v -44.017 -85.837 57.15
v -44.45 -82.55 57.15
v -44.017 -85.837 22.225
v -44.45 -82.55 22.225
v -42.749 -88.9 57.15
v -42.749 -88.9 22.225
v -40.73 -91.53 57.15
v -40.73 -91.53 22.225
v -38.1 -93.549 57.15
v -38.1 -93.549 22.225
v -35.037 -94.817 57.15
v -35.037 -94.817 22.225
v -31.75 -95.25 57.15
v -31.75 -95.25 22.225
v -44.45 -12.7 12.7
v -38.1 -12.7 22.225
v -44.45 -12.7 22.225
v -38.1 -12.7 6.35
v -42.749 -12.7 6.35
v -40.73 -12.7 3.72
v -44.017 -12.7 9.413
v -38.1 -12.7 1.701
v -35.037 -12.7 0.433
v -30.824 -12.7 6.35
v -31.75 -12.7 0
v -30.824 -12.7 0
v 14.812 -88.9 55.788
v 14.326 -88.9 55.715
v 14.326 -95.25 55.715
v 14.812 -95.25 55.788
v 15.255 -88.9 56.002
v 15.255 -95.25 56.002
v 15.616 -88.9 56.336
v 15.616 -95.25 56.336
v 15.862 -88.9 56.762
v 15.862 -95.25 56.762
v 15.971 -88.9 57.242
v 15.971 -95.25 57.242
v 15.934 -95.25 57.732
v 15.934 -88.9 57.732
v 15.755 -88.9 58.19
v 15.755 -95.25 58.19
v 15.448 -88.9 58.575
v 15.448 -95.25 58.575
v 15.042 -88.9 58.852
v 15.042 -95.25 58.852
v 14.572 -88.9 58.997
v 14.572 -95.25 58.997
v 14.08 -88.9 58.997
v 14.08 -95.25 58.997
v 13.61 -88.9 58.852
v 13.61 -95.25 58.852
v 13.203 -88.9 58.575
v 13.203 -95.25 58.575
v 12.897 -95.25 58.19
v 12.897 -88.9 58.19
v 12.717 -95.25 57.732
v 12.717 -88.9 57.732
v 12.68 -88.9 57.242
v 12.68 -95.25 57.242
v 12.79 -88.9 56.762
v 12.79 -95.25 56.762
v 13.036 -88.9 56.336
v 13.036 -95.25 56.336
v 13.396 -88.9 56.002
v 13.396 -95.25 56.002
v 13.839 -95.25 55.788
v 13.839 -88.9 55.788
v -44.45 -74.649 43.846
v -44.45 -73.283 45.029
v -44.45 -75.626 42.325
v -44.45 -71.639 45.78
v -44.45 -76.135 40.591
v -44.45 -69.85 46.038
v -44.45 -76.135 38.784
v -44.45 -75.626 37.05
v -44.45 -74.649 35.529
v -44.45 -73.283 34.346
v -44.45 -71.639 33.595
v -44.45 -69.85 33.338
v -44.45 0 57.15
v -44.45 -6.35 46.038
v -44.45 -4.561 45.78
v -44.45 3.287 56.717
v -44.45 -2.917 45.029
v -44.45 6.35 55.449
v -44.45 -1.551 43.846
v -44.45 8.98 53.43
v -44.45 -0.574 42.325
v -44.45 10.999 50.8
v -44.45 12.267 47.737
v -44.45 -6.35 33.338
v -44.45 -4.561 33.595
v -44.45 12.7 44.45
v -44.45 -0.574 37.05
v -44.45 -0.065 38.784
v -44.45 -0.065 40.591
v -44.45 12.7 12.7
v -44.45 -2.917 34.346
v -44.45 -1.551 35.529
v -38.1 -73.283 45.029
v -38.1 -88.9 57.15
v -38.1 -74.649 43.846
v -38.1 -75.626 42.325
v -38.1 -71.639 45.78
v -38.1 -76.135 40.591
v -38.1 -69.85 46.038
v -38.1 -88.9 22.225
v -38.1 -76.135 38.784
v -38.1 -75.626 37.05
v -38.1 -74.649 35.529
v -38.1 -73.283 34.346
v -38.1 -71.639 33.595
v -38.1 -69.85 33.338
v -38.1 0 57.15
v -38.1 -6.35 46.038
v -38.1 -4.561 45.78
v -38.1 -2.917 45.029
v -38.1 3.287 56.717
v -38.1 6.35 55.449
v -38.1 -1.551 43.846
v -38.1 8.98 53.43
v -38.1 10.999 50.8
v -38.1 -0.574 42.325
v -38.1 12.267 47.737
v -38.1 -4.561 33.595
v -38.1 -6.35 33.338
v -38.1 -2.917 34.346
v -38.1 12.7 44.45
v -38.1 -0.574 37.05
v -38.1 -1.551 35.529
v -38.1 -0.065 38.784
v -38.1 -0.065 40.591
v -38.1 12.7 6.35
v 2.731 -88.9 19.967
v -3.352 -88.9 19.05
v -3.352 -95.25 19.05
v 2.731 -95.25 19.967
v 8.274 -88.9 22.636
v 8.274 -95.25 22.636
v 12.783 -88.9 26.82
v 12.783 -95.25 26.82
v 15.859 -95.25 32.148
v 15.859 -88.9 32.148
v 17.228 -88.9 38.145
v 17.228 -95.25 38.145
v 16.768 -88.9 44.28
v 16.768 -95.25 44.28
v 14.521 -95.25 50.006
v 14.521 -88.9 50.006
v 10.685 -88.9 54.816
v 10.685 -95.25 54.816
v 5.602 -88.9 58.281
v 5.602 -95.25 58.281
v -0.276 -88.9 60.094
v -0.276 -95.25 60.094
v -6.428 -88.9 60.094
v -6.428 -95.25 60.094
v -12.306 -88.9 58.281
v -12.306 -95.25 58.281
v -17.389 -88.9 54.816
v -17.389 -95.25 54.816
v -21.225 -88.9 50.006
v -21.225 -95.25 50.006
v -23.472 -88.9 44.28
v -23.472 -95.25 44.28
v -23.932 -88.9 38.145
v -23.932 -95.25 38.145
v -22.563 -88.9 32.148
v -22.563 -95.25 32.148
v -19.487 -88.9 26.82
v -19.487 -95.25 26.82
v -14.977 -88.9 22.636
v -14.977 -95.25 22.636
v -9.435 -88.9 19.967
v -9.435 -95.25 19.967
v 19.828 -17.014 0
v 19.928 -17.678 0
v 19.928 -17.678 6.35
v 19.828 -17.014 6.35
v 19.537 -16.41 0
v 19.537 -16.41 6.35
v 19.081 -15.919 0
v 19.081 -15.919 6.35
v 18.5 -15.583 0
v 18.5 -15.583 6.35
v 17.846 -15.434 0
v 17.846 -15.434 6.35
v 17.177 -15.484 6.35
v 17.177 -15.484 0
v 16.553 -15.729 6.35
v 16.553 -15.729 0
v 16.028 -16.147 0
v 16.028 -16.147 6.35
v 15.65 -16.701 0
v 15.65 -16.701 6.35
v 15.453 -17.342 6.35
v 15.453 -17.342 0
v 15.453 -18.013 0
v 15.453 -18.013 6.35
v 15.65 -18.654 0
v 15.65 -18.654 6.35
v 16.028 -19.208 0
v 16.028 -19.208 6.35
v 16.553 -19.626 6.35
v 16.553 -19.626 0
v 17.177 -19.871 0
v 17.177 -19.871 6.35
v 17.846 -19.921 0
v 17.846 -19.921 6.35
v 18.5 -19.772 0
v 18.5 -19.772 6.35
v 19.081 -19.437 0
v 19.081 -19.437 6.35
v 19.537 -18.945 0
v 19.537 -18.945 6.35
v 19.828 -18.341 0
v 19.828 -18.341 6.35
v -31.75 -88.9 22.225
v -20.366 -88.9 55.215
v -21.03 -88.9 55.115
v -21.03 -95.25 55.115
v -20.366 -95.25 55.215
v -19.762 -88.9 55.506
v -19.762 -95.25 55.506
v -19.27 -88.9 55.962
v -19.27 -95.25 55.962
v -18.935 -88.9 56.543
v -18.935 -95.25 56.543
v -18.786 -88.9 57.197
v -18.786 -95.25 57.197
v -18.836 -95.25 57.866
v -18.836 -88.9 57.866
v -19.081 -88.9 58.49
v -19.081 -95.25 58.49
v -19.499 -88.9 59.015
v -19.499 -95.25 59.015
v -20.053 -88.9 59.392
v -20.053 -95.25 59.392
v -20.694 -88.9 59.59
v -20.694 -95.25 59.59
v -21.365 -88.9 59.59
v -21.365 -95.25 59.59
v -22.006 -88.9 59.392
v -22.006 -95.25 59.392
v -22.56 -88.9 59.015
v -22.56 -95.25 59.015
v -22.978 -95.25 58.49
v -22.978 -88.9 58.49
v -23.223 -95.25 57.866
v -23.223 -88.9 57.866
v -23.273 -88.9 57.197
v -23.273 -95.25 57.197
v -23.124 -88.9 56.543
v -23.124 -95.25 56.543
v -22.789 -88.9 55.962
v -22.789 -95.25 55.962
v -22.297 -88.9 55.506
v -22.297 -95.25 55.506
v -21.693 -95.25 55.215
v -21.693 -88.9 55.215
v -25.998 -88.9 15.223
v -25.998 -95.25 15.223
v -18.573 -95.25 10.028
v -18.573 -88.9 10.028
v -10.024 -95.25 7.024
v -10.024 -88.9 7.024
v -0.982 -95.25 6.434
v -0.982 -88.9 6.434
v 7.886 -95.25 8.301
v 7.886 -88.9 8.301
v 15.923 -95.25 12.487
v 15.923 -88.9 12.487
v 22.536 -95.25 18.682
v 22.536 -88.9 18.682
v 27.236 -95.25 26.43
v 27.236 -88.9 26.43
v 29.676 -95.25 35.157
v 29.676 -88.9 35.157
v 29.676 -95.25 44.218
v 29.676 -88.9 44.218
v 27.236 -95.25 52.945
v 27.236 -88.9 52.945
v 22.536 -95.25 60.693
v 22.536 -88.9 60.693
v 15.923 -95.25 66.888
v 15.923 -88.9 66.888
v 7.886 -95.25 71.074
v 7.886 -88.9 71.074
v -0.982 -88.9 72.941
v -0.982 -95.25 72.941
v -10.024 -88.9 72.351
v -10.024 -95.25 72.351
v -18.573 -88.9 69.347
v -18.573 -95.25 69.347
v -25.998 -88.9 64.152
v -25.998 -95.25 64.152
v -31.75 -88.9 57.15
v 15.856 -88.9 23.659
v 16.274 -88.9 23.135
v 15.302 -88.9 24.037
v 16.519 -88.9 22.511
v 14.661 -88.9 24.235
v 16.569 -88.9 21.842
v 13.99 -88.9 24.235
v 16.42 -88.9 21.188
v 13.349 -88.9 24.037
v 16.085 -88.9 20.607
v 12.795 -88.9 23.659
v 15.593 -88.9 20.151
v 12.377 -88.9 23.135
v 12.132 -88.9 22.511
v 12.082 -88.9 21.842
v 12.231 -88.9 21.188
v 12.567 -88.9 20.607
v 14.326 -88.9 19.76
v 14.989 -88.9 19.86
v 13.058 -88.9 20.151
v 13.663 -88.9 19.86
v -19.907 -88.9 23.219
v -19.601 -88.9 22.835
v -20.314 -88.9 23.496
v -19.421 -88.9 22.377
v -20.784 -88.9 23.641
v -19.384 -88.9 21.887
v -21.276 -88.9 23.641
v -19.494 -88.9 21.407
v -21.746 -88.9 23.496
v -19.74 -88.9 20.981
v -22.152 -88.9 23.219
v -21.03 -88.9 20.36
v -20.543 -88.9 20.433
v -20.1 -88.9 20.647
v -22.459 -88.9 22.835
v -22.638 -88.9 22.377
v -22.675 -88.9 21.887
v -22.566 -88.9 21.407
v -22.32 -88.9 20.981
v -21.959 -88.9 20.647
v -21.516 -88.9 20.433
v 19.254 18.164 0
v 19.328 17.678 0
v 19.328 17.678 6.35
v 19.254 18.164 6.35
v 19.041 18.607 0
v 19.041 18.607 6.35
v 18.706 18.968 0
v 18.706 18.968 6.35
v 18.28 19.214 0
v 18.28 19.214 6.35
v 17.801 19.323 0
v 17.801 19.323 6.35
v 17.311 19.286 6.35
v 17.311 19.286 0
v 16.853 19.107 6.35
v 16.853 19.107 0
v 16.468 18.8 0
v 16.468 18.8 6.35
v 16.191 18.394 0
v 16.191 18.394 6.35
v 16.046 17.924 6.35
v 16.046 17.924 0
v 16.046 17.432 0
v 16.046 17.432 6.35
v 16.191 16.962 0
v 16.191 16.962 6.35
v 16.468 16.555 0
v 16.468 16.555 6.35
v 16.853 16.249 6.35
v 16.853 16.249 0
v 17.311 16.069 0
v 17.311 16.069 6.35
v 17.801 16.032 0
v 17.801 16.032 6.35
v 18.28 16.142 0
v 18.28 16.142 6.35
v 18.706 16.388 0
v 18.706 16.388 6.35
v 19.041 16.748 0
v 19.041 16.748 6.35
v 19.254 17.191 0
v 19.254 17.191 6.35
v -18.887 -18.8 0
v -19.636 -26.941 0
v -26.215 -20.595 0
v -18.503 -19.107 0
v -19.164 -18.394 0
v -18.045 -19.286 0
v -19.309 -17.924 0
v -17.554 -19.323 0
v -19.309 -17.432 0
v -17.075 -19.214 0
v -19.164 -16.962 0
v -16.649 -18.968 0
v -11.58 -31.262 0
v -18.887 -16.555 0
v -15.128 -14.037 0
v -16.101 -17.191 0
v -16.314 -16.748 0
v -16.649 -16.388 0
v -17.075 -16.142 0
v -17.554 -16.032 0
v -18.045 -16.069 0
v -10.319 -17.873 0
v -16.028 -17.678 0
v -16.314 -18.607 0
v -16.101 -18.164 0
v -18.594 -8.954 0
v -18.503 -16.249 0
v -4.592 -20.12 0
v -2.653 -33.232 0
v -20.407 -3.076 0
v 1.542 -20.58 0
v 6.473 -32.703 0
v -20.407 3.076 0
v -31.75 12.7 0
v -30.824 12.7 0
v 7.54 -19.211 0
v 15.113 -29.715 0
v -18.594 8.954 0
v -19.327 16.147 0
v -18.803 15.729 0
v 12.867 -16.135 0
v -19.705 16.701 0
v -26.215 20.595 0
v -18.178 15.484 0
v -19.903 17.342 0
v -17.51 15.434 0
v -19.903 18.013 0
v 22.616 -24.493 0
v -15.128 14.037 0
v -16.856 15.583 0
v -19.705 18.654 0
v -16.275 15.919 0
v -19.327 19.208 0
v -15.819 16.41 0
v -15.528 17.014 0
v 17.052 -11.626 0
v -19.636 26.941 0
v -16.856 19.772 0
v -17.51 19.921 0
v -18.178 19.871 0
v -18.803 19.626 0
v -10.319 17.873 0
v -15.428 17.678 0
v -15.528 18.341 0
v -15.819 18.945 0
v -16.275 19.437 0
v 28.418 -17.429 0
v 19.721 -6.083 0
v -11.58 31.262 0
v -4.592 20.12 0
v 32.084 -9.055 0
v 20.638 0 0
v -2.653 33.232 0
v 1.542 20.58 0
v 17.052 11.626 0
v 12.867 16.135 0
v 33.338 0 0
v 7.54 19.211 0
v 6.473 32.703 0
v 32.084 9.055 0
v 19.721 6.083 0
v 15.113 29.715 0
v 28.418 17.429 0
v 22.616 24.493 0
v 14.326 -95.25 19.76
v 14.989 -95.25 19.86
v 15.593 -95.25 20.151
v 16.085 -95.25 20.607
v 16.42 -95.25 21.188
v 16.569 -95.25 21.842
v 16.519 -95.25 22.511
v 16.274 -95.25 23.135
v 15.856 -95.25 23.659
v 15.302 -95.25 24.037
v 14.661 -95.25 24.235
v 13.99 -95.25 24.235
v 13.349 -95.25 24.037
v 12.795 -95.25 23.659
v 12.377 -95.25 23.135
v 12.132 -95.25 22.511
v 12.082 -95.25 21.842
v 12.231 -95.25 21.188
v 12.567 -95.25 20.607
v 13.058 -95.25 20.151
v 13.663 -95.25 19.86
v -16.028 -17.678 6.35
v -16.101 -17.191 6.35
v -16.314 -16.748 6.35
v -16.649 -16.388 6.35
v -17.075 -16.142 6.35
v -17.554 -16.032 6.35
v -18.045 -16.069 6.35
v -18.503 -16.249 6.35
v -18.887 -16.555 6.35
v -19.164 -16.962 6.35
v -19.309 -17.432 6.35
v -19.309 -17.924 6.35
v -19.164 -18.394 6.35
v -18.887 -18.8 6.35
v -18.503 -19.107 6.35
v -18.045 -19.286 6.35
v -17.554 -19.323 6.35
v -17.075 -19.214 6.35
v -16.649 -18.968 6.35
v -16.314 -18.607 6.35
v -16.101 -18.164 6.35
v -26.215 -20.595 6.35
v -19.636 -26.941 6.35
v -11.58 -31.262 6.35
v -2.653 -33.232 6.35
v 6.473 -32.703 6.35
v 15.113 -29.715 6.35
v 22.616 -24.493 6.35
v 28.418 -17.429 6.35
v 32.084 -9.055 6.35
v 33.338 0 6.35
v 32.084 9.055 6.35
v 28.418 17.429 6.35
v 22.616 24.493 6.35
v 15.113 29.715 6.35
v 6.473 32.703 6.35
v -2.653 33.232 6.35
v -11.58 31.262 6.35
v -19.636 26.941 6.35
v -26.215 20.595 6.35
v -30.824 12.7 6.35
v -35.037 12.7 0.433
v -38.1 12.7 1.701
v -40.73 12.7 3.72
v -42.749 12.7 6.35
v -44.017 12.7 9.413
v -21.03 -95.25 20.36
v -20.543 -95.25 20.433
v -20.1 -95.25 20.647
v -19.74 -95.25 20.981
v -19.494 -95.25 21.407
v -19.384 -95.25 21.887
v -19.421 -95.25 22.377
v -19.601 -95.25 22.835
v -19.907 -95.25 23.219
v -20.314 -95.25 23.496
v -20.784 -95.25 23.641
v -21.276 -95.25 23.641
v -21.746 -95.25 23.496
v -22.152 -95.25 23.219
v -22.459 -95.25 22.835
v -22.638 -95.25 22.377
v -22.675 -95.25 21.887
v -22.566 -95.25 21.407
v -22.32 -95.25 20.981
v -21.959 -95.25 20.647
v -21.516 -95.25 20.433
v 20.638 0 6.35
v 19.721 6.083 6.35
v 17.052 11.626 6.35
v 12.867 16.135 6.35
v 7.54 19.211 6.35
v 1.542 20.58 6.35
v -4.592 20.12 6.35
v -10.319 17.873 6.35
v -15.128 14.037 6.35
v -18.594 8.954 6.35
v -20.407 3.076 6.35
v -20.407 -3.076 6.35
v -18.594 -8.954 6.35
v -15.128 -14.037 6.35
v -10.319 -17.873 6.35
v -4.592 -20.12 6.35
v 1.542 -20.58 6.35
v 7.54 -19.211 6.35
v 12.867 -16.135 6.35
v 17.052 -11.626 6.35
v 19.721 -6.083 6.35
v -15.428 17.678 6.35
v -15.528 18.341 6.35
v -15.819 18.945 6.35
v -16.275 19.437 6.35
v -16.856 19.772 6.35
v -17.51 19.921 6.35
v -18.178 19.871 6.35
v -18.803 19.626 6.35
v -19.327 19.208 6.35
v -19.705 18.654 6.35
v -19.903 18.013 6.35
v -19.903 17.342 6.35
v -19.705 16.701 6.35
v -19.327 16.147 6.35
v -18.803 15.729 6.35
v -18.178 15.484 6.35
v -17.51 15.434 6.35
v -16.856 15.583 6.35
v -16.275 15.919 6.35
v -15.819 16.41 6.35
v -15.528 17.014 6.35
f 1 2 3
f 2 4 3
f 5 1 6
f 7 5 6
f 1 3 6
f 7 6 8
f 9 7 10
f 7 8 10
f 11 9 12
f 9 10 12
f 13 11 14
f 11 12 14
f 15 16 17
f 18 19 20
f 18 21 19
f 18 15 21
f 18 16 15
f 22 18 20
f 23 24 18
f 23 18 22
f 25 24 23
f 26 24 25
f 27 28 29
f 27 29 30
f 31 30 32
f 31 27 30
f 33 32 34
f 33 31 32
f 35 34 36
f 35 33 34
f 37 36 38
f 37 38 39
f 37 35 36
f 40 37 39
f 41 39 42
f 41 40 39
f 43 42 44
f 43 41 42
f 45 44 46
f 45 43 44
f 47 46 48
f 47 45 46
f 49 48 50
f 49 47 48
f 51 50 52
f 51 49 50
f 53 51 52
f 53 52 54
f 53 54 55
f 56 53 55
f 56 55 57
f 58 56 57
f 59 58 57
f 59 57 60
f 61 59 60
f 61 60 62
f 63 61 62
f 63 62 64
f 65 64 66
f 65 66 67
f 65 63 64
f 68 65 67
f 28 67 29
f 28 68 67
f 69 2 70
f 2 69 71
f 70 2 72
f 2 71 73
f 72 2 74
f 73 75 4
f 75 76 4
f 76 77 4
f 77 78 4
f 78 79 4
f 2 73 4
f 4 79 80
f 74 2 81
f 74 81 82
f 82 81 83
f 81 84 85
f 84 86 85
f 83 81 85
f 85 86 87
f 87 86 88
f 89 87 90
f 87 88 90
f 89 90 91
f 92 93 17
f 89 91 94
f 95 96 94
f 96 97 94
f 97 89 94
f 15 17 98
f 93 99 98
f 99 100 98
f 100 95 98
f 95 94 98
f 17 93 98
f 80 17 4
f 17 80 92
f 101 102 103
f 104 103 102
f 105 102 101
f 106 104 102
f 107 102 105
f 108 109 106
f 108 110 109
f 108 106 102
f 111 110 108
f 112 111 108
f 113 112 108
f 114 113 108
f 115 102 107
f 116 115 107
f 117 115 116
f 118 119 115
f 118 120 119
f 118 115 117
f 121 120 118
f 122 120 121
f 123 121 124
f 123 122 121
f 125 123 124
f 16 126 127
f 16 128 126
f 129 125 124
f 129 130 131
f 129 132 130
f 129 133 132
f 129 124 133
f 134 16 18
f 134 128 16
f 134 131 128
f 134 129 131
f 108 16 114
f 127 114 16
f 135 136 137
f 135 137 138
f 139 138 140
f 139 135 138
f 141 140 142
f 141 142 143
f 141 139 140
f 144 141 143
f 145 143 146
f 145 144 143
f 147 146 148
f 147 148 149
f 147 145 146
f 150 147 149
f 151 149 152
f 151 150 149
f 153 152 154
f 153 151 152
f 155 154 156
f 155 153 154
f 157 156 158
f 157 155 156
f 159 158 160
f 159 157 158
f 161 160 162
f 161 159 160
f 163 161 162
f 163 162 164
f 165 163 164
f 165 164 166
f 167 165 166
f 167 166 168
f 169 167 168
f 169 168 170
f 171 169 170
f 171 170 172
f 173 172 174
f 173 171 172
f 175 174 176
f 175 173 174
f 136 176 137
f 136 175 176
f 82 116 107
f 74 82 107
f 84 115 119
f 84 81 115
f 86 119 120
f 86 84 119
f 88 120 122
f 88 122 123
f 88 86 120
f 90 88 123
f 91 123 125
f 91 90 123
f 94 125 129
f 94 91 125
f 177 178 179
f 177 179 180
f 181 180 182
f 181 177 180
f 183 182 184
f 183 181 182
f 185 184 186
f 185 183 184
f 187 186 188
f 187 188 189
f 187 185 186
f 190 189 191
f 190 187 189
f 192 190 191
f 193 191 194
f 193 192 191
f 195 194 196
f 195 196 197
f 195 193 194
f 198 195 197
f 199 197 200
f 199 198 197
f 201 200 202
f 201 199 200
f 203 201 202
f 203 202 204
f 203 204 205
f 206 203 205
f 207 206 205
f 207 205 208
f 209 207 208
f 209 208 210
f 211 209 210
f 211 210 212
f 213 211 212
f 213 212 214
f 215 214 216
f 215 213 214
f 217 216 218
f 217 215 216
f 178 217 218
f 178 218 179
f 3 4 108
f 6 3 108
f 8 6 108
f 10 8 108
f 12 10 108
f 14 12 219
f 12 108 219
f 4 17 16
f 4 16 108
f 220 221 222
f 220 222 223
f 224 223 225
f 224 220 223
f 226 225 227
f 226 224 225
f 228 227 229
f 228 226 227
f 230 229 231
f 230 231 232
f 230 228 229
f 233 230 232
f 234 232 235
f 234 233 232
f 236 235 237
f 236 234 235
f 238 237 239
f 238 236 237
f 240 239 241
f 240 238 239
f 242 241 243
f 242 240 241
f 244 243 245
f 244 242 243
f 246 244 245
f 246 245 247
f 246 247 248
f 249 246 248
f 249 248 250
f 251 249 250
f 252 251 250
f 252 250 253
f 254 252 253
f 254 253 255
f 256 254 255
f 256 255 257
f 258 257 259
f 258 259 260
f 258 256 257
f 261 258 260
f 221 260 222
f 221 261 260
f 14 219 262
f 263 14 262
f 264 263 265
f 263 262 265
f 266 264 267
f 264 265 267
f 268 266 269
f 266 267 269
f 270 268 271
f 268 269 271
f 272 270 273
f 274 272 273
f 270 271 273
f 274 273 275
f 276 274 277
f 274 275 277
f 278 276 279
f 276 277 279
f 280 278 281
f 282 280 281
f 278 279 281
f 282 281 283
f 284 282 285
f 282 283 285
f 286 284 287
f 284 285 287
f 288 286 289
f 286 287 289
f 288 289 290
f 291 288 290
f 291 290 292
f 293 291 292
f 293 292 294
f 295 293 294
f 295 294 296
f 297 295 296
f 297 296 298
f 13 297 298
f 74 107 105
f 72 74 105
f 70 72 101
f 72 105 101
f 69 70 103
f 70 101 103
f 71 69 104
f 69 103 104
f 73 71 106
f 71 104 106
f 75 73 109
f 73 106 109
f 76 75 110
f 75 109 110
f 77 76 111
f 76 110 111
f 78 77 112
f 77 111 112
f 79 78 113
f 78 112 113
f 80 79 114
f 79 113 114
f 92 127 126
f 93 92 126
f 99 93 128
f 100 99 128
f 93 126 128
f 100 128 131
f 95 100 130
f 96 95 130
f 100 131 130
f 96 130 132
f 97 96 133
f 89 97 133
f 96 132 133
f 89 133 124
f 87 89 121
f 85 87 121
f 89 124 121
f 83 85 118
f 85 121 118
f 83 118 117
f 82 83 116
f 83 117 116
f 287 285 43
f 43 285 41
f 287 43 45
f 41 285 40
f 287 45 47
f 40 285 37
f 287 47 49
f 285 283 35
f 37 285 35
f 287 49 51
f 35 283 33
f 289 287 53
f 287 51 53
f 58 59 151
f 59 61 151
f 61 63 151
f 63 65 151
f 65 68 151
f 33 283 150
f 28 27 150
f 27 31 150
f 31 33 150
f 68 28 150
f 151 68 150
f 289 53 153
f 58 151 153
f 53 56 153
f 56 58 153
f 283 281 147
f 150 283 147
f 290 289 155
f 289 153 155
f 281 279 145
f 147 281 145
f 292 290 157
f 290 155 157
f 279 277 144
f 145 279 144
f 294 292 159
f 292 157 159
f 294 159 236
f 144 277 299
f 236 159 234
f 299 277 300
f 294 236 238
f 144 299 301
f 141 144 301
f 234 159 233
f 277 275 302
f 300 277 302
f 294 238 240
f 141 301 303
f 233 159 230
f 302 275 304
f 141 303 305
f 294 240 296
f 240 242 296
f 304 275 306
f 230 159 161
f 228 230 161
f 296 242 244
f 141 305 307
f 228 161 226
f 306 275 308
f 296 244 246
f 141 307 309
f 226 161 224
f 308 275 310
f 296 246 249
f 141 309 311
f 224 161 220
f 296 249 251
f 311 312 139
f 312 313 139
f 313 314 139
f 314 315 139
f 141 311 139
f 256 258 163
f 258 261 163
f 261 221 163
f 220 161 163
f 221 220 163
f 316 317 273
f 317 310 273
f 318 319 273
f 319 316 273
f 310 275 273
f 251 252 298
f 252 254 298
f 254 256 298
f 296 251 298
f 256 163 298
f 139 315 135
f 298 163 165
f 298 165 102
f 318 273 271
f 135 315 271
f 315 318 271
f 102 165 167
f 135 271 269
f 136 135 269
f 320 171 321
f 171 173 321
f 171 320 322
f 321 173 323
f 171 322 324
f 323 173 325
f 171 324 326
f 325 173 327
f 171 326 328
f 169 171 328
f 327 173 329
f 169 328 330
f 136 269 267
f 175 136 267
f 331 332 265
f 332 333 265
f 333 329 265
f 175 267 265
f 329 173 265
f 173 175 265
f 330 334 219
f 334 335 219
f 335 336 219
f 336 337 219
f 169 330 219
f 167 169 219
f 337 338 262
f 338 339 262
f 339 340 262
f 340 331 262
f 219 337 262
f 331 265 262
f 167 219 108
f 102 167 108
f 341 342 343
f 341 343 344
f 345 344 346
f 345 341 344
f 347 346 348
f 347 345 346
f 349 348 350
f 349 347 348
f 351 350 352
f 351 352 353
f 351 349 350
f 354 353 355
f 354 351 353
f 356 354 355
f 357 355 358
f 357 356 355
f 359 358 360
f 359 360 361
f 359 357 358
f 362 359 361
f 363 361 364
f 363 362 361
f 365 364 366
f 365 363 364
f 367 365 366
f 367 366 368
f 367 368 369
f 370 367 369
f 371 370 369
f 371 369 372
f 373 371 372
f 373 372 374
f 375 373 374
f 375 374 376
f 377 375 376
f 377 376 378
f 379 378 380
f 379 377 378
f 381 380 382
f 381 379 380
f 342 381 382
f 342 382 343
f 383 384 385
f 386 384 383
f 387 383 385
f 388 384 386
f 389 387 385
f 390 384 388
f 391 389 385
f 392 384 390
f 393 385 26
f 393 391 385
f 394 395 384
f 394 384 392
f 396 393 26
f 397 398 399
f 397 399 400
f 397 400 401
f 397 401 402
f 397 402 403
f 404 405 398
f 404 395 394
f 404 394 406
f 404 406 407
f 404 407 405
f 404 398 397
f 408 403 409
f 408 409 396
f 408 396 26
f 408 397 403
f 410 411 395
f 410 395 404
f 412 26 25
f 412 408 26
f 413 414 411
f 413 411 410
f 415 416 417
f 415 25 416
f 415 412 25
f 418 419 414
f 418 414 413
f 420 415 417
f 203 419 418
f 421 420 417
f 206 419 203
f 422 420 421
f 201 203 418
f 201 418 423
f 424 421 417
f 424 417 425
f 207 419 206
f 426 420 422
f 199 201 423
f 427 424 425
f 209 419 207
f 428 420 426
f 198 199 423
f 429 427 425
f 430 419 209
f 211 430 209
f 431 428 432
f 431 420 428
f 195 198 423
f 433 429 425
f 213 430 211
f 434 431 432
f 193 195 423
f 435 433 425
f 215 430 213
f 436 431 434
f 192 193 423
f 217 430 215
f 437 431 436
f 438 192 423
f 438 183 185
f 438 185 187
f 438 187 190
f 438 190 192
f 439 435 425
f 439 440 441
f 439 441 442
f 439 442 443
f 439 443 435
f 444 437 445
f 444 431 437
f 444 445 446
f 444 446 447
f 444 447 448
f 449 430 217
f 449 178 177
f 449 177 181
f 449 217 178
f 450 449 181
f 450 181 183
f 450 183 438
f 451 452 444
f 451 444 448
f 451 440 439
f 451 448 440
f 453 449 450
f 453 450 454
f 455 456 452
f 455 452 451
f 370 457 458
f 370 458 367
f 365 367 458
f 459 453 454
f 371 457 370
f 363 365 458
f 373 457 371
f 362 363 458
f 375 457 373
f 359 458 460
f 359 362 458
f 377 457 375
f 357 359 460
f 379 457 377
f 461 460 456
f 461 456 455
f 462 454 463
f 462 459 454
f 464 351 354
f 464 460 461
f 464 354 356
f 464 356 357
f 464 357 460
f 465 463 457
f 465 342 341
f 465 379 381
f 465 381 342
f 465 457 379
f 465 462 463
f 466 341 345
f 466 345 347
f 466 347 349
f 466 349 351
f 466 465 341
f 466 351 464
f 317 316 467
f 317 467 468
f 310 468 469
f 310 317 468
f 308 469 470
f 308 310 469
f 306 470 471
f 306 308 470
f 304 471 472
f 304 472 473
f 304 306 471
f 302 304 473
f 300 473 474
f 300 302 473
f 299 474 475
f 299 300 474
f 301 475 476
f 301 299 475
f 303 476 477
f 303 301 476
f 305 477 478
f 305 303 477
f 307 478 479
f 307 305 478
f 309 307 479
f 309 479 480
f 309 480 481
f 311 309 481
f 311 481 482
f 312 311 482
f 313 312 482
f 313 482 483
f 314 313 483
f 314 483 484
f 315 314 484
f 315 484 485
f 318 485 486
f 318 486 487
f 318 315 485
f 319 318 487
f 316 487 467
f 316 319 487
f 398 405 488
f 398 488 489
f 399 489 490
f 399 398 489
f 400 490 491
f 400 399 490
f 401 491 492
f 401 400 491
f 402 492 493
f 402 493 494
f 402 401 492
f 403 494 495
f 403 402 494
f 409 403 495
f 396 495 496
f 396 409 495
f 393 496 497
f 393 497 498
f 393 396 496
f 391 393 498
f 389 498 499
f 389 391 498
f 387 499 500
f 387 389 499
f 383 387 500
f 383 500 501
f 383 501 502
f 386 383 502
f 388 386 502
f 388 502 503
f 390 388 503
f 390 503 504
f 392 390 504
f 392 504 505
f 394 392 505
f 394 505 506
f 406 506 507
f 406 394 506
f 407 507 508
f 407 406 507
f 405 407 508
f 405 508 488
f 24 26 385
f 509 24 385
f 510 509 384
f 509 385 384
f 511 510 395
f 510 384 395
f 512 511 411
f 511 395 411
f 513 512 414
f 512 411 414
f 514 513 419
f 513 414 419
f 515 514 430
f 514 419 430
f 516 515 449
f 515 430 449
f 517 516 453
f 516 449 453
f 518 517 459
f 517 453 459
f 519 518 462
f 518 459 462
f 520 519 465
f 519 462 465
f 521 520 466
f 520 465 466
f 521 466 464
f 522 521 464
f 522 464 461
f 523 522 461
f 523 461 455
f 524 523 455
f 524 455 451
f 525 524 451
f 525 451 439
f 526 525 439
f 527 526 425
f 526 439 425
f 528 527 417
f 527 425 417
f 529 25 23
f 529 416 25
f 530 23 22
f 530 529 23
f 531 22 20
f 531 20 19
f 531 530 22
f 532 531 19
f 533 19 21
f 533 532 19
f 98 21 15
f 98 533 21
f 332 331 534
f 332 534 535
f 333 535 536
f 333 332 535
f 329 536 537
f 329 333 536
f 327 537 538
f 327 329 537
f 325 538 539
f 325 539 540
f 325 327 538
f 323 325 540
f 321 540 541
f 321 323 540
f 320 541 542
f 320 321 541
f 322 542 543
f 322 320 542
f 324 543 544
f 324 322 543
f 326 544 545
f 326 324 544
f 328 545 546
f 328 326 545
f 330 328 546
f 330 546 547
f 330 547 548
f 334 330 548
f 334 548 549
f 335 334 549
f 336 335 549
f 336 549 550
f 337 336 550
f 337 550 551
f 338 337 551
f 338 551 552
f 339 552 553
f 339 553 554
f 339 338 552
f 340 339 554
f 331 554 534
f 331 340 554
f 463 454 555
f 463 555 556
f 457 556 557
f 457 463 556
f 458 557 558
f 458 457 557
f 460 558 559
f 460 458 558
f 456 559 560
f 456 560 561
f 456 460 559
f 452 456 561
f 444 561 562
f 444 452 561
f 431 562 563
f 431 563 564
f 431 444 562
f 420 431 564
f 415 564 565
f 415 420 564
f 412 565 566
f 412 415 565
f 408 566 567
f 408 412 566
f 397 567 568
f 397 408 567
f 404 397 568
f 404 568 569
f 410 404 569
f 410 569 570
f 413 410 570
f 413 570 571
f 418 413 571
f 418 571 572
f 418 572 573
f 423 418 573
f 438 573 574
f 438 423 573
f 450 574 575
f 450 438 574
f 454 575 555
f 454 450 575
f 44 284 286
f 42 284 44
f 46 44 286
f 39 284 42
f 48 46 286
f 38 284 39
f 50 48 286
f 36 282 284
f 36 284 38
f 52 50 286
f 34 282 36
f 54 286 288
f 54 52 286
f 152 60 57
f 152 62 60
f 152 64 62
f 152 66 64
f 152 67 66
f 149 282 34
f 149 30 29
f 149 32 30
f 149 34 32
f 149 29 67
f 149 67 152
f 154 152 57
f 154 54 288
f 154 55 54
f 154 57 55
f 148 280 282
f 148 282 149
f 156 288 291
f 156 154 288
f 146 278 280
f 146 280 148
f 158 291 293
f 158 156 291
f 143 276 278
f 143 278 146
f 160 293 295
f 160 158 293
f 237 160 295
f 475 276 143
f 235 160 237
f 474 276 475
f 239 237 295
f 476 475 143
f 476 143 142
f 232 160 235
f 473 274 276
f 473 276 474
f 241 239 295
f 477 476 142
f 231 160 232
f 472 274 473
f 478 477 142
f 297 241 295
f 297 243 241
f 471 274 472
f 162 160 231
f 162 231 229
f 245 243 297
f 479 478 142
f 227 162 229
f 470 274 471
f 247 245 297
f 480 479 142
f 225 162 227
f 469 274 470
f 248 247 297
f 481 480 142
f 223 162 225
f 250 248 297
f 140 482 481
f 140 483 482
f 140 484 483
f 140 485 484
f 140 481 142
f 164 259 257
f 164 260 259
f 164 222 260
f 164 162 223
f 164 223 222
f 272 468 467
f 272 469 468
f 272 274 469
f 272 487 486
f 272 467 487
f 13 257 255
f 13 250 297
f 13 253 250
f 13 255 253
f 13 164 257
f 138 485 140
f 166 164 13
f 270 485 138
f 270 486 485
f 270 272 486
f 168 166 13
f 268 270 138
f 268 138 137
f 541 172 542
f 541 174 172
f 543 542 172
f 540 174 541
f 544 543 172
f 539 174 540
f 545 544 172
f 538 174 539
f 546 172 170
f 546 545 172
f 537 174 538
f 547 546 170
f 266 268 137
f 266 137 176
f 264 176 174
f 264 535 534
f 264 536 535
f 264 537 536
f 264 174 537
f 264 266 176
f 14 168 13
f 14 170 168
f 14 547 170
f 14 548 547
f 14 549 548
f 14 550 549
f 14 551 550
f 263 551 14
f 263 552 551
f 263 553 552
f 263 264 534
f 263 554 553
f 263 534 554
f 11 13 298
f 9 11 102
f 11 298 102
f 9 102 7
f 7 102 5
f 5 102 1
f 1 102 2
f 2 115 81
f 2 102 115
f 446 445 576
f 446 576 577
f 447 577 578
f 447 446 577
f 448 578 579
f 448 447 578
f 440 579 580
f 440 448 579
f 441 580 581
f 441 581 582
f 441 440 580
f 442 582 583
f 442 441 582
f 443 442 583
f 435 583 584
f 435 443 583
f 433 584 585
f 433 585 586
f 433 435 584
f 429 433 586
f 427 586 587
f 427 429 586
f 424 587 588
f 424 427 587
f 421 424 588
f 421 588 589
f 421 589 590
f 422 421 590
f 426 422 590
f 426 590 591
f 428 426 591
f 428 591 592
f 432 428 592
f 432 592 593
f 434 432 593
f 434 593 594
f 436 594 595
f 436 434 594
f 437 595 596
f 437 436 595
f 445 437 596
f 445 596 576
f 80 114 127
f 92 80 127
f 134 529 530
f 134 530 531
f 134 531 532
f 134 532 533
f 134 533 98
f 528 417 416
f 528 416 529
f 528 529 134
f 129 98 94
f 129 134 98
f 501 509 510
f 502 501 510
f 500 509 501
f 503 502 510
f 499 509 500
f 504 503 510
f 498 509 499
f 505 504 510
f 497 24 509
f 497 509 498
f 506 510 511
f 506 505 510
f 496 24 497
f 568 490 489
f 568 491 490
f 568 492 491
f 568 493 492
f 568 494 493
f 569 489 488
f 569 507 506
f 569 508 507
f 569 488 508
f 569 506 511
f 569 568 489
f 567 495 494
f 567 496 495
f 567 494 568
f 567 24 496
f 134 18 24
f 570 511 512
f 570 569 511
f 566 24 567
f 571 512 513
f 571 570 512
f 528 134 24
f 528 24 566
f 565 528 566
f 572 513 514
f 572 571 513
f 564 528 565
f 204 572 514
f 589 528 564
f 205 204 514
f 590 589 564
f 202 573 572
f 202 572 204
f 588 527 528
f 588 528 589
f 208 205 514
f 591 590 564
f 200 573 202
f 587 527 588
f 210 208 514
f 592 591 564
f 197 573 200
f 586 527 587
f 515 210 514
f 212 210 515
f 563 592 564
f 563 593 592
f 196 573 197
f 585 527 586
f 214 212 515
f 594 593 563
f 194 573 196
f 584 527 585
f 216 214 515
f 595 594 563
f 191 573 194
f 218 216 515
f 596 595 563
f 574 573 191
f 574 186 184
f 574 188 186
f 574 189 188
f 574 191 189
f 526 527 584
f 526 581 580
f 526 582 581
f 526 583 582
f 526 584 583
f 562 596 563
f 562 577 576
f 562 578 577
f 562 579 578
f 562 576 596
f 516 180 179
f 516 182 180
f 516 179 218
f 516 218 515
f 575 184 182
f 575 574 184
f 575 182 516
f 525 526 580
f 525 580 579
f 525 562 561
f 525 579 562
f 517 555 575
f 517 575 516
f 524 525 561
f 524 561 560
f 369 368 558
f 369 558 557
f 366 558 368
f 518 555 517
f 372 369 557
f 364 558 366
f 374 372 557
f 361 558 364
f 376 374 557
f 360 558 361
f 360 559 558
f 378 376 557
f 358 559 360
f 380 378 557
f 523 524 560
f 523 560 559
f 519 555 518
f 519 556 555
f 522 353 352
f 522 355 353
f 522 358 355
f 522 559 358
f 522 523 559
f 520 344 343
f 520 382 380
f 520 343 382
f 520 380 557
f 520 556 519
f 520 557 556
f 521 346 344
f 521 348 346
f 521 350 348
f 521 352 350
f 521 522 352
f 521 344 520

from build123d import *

# Parameters (mm, degrees)
SKETCH1_R           = 33.3375
SKETCH1_R_2         = 2.25
SKETCH1_R_3         = 1.65
SKETCH1_R_4         = 20.6375
BOSS_EXTRUDE1_DEPTH = 6.35
BOSS_EXTRUDE3_DEPTH = 6.35
SKETCH4_R           = 33.3375
SKETCH4_R_2         = 2.25
SKETCH4_R_3         = 1.65
SKETCH4_R_4         = 20.6375
BOSS_EXTRUDE4_DEPTH = 6.35
FILLET1_R           = 12.7
FILLET2_R           = 12.7
FILLET3_R           = 12.7


with BuildPart() as part:
    # Sketch1 → Boss-Extrude1 (new body)
    # profile 1 of 2: a face of its own
    with BuildSketch(Plane.XY):
        Circle(SKETCH1_R)
        with Locations((-17.67766953, 17.67766953)):
            Circle(SKETCH1_R_2, mode=Mode.SUBTRACT)
        with Locations((17.67766953, 17.67766953)):
            Circle(SKETCH1_R_3, mode=Mode.SUBTRACT)
        with Locations((17.67766953, -17.67766953)):
            Circle(SKETCH1_R_2, mode=Mode.SUBTRACT)
        with Locations((-17.67766953, -17.67766953)):
            Circle(SKETCH1_R_3, mode=Mode.SUBTRACT)
        Circle(SKETCH1_R_4, mode=Mode.SUBTRACT)
    # profile 2 of 2: a face of its own
    with BuildSketch(Plane.XY):
        with BuildLine():
            ThreePointArc((-30.823674444, -12.7), (-33.3375, 0), (-30.823674444, 12.7))
            Line((-30.823674444, 12.7), (-38.1, 12.7))
            Line((-38.1, 12.7), (-38.1, -12.7))
            Line((-38.1, -12.7), (-30.823674444, -12.7))
        make_face()
    extrude(amount=BOSS_EXTRUDE1_DEPTH)

    # Sketch2 → Boss-Extrude3 (add)
    with BuildSketch(Plane.ZY.offset(38.1)):
        Polygon((0, 12.7), (57.15, 12.7), (57.15, -88.9), (22.225, -88.9), (22.225, -12.7), (0, -12.7), align=None)
        with BuildLine():
            Line((46.0375, -6.35), (46.0375, -69.85))
            ThreePointArc((46.0375, -69.85), (39.6875, -76.2), (33.3375, -69.85))
            Line((33.3375, -69.85), (33.3375, -6.35))
            ThreePointArc((33.3375, -6.35), (39.6875, 0), (46.0375, -6.35))
        make_face(mode=Mode.SUBTRACT)
    extrude(amount=BOSS_EXTRUDE3_DEPTH)

    # Sketch4 → Boss-Extrude4 (add)
    # profile 1 of 2: a face of its own
    with BuildSketch(Plane(origin=(0, -88.9, 0), x_dir=(-1, 0, 0), z_dir=(0, -1, 0))):
        with BuildLine():
            ThreePointArc((36.689436686, -39.6875), (35.430818695, -48.761321425), (31.75, -57.15))
            Line((31.75, -57.15), (44.45, -57.15))
            Line((44.45, -57.15), (44.45, -22.225))
            Line((44.45, -22.225), (31.75, -22.225))
            ThreePointArc((31.75, -22.225), (35.430818695, -30.613678575), (36.689436686, -39.6875))
        make_face()
    # profile 2 of 2: a face of its own
    with BuildSketch(Plane(origin=(0, -88.9, 0), x_dir=(-1, 0, 0), z_dir=(0, -1, 0))):
        with Locations((3.351936686, -39.6875)):
            Circle(SKETCH4_R)
        with Locations(Location((21.029606215, -57.36516953, 0), (0, 0, 90))):
            Circle(SKETCH4_R_2, mode=Mode.SUBTRACT)
        with Locations(Location((-14.325732844, -57.36516953, 0), (0, 0, 90))):
            Circle(SKETCH4_R_3, mode=Mode.SUBTRACT)
        with Locations(Location((-14.325732844, -22.00983047, 0), (0, 0, 90))):
            Circle(SKETCH4_R_2, mode=Mode.SUBTRACT)
        with Locations(Location((21.029606215, -22.00983047, 0), (0, 0, 90))):
            Circle(SKETCH4_R_3, mode=Mode.SUBTRACT)
        with Locations(Location((3.351936686, -39.6875, 0), (0, 0, 90))):
            Circle(SKETCH4_R_4, mode=Mode.SUBTRACT)
    extrude(amount=BOSS_EXTRUDE4_DEPTH)

    # Fillet1
    fillet1_edges = [part.edges().sort_by_distance(p)[0] for p in [
        (-44.45, 0, 0),
    ]]
    fillet(fillet1_edges, radius=FILLET1_R)

    # Fillet2
    fillet2_edges = [part.edges().sort_by_distance(p)[0] for p in [
        (-44.45, -95.25, 39.6875),
    ]]
    fillet(fillet2_edges, radius=FILLET2_R)

    # Fillet3
    fillet3_edges = [part.edges().sort_by_distance(p)[0] for p in [
        (-41.275, 12.7, 57.15),
    ]]
    fillet(fillet3_edges, radius=FILLET3_R)


solid = part.part
